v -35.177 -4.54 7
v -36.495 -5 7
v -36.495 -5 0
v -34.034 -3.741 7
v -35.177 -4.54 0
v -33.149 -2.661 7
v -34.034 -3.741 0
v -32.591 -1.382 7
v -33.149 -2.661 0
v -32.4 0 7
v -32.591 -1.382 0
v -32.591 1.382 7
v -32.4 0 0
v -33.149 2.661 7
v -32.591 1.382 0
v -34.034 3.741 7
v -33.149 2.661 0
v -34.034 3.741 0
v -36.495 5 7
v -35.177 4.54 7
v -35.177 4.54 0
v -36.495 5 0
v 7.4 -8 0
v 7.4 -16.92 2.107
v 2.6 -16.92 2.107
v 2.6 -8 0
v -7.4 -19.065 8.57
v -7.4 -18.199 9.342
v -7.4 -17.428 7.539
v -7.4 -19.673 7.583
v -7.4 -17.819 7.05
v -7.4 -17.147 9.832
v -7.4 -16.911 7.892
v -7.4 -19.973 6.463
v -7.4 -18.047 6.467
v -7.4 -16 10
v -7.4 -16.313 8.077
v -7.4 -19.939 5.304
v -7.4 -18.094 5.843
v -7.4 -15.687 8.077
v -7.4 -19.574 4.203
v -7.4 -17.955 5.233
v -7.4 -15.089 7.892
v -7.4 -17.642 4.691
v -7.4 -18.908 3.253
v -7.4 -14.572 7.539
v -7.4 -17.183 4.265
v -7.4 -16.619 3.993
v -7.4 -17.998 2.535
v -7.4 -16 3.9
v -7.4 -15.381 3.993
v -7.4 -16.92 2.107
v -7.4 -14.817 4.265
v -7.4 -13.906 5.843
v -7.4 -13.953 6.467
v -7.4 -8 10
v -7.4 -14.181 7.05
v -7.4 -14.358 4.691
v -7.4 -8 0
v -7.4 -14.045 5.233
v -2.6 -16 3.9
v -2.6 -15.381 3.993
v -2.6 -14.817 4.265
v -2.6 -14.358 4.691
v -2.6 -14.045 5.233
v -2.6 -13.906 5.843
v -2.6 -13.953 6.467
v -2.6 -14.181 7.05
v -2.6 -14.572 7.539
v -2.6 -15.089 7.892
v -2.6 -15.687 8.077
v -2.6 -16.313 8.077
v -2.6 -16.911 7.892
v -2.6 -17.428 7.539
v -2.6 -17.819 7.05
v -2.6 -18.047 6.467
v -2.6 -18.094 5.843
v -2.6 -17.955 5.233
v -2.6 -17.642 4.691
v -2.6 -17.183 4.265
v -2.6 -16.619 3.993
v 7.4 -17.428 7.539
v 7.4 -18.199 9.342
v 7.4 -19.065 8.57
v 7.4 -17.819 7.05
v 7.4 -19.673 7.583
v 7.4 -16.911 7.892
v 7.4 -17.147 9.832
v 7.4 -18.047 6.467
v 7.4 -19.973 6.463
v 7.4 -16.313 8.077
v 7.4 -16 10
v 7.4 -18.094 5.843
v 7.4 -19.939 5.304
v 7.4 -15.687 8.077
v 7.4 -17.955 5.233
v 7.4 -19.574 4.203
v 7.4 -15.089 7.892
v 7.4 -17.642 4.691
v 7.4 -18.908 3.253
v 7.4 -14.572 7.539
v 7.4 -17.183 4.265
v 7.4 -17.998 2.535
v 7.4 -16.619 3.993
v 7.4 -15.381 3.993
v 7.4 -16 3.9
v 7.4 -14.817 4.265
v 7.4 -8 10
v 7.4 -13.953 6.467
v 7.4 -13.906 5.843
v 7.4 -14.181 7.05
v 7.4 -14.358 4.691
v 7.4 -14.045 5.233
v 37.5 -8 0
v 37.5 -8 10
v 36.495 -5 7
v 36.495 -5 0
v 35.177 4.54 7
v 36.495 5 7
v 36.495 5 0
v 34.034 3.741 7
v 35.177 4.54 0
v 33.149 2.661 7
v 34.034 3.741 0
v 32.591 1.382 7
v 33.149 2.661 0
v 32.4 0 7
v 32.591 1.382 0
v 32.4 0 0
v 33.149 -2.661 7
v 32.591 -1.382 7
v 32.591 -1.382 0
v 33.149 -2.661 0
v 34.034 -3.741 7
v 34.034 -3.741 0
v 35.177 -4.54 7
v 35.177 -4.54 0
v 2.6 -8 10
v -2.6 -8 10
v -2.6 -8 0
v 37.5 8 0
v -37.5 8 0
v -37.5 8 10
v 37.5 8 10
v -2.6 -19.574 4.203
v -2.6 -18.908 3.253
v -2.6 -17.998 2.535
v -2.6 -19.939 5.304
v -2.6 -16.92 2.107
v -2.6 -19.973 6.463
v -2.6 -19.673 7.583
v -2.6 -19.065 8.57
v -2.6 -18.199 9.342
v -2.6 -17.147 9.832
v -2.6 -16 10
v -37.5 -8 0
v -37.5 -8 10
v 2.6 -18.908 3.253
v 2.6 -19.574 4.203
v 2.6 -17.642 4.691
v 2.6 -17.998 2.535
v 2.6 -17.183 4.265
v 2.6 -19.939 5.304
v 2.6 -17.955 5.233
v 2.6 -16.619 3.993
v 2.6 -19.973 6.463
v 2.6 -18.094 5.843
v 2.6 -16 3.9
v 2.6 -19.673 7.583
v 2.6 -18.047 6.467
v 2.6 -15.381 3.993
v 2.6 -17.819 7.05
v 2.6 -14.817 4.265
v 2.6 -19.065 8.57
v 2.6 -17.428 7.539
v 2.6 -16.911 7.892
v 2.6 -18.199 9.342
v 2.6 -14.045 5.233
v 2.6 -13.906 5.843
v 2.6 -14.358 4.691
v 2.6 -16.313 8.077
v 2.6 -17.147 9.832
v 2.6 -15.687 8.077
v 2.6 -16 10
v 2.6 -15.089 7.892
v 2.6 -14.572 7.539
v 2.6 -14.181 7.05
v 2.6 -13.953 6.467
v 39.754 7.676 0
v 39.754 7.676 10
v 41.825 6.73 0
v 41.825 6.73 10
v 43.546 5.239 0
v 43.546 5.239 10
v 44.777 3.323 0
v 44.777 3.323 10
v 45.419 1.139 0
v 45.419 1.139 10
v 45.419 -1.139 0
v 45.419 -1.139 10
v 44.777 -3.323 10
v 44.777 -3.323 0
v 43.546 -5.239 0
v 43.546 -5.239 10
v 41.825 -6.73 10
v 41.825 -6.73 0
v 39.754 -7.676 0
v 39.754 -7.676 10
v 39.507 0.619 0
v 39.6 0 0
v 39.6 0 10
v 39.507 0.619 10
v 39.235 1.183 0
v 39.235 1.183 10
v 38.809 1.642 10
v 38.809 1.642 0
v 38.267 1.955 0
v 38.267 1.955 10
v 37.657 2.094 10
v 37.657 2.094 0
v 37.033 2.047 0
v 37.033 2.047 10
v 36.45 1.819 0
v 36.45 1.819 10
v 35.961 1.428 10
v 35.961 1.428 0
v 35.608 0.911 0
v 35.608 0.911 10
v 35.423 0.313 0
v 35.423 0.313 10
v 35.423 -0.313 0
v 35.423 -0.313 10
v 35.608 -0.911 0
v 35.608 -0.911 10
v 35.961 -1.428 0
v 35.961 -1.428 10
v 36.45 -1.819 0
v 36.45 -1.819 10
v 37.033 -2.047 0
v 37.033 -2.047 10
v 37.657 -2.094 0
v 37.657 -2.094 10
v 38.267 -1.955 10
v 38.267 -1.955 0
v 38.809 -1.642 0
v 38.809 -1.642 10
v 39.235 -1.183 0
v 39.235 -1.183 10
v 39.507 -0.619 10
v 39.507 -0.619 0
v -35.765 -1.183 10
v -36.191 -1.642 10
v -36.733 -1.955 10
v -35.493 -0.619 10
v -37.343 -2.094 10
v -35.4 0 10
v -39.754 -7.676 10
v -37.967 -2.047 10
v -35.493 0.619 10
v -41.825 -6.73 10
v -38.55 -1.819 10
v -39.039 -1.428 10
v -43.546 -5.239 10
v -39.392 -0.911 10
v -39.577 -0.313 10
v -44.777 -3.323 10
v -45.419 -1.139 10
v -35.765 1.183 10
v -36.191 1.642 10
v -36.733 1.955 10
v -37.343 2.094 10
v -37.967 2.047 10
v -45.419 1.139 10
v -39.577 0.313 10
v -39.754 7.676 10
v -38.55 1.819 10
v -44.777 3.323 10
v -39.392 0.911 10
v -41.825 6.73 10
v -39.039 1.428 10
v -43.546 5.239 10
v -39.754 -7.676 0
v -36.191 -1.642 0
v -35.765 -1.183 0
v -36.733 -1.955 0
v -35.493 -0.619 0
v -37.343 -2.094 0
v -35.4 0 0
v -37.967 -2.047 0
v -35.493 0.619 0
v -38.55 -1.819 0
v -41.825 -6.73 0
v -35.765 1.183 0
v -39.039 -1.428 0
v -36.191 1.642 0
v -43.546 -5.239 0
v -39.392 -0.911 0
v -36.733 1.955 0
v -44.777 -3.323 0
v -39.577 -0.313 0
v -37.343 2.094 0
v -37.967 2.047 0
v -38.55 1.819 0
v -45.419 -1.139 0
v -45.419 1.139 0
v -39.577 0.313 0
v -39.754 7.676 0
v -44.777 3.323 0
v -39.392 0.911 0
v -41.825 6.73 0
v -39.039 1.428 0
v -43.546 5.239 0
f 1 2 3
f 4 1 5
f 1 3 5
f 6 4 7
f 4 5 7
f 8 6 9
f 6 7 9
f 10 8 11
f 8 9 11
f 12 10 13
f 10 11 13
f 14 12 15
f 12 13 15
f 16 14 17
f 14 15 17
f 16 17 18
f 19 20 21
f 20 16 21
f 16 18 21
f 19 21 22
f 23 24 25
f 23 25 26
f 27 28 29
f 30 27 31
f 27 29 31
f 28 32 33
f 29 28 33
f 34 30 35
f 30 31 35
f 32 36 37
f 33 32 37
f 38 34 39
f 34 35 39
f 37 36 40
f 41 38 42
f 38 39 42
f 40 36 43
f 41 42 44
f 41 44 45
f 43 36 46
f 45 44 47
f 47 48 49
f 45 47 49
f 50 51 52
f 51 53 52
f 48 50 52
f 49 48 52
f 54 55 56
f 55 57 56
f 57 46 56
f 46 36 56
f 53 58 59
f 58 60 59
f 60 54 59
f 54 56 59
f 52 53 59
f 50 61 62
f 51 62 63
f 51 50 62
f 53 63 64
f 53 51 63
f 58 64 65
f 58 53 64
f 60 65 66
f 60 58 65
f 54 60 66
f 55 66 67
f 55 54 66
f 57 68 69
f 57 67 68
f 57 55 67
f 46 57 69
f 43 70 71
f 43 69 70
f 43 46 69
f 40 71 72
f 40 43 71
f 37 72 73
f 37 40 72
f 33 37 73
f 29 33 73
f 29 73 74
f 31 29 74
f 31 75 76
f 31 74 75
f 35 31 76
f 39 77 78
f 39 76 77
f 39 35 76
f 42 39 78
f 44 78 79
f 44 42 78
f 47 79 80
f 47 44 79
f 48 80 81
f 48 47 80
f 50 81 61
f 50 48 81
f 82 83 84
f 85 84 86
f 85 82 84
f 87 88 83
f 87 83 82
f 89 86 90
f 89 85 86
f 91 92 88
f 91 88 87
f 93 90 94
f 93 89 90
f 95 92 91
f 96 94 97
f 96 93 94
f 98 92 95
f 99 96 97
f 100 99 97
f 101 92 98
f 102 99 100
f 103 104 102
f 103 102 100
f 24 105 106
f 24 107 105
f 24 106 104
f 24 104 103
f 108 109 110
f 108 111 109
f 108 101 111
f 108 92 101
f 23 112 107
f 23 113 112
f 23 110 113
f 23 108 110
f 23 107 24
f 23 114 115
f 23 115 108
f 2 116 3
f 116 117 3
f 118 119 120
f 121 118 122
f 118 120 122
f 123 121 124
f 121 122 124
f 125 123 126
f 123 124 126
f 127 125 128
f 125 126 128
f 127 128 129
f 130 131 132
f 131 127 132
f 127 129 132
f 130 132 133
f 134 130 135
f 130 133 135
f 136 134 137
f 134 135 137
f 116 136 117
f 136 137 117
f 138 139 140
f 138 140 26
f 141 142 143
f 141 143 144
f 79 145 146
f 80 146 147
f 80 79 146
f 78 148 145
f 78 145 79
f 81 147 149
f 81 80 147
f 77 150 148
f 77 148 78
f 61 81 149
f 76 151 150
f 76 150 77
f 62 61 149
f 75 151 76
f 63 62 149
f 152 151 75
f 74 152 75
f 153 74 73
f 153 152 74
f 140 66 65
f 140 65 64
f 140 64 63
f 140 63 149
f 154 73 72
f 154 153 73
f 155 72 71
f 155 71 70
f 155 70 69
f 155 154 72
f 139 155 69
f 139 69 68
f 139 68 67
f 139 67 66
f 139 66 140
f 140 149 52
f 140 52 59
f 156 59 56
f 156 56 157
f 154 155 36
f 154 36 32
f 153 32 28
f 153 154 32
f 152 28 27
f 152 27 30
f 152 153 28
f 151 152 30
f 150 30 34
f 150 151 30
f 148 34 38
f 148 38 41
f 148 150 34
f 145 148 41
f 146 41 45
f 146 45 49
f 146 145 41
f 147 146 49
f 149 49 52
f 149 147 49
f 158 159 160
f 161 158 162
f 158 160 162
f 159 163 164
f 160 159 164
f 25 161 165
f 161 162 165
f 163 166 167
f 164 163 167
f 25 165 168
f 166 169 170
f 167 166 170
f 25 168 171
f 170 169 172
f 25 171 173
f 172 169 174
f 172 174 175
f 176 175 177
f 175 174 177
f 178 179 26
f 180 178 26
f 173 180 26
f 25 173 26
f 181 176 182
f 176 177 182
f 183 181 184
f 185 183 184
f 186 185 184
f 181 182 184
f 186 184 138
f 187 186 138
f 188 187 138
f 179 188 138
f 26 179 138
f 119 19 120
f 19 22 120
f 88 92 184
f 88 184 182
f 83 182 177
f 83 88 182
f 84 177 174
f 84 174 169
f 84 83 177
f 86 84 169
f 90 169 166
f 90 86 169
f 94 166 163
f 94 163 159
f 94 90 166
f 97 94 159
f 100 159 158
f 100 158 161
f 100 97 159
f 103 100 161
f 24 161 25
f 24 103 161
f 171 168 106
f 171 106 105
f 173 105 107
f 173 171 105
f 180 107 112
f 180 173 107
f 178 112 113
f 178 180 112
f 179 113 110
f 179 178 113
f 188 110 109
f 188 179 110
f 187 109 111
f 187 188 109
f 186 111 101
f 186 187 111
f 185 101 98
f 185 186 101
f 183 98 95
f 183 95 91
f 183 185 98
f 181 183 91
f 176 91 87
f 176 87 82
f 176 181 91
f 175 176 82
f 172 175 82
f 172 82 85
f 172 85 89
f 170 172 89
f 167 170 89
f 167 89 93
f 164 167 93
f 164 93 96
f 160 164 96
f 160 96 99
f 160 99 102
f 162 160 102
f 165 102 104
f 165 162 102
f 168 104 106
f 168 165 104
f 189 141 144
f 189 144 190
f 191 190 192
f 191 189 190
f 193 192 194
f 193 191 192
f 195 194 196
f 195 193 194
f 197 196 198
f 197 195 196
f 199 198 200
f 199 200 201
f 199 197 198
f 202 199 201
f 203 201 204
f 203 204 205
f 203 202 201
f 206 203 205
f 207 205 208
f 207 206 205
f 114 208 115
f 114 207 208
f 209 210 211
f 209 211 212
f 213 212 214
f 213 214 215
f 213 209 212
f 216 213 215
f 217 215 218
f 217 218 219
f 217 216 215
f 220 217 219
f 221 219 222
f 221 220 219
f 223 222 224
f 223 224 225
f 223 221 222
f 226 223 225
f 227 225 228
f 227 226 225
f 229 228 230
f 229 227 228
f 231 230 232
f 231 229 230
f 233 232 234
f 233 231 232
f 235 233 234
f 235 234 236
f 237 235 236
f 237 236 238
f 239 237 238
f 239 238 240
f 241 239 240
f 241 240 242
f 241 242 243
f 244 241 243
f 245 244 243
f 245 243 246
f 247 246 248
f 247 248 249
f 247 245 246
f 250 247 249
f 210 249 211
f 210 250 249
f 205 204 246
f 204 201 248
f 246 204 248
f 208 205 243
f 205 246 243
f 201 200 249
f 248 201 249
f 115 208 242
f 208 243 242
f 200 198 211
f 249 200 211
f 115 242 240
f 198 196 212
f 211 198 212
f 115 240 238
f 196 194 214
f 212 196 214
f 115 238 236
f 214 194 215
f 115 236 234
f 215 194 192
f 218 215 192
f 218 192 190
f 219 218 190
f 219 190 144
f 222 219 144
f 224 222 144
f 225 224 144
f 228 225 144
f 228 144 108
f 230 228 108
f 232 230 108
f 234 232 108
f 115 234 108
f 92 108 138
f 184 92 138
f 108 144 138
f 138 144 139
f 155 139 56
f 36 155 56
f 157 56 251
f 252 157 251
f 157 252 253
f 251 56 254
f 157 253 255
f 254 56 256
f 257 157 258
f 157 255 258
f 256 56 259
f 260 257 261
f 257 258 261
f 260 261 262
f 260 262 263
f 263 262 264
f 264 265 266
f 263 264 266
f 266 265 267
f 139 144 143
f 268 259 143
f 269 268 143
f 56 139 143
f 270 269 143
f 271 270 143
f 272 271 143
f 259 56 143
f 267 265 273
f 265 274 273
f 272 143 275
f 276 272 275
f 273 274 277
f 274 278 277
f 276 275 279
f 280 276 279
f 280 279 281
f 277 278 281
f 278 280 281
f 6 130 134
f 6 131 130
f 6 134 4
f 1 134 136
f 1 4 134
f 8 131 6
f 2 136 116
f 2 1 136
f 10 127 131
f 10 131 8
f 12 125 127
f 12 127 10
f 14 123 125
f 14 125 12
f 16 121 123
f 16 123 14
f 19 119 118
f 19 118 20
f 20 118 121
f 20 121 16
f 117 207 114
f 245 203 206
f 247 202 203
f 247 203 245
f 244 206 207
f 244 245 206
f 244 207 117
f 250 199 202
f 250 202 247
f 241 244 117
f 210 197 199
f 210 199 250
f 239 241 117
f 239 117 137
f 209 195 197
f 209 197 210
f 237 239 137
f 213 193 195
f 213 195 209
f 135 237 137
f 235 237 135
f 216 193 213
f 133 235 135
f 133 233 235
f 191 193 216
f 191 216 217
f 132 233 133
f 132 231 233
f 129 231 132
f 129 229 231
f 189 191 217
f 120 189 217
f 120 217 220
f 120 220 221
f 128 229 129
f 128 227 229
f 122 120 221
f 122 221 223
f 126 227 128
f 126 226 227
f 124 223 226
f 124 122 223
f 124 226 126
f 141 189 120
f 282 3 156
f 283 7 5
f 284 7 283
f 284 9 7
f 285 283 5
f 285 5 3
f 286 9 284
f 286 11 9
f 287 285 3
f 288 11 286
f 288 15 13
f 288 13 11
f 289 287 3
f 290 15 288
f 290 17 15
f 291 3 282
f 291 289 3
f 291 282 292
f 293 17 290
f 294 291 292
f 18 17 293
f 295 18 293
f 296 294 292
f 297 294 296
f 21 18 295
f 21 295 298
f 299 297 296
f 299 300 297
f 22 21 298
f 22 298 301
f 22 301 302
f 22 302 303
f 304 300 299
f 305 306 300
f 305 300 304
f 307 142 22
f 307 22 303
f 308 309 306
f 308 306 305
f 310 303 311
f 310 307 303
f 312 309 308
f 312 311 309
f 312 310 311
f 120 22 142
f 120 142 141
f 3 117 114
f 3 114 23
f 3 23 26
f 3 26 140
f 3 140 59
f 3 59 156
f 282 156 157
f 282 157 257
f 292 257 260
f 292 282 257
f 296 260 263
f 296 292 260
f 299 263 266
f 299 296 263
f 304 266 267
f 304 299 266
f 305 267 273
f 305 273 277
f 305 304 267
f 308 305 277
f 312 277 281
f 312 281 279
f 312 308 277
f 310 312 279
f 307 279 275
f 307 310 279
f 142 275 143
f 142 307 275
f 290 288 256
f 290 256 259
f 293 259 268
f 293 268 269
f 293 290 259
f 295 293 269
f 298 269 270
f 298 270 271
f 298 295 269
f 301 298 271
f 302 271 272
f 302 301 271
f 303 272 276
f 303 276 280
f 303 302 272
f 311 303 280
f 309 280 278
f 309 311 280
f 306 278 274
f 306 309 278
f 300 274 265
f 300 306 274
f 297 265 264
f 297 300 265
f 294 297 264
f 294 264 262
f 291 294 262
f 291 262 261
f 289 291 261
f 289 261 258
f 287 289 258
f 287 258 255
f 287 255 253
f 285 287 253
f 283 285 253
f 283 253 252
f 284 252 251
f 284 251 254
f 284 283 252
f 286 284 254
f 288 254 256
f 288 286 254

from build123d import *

# Parameters (mm, degrees)
SKETCH1_R               = 2.1
BOSS_EXTRUDE1_DEPTH     = 10
SHELL2_T                = -3
SKETCH2_R               = 2.1
BOSS_EXTRUDE2_DEPTH     = 7.4
SKETCH3_W               = 5.2
SKETCH3_H               = 14
CUT_EXTRUDE1_DEPTH      = 1
CUT_EXTRUDE1_DEPTH_BACK = 11


with BuildPart() as part:
    # Sketch1 → Boss-Extrude1 (new body)
    with BuildSketch(Plane.XY):
        with BuildLine():
            Line((-37.5, 8), (37.5, 8))
            ThreePointArc((37.5, 8), (45.5, 0), (37.5, -8))
            Line((37.5, -8), (-37.5, -8))
            ThreePointArc((-37.5, -8), (-45.5, 0), (-37.5, 8))
        make_face()
        with Locations((-37.5, 0)):
            Circle(SKETCH1_R, mode=Mode.SUBTRACT)
        with Locations((37.5, 0)):
            Circle(SKETCH1_R, mode=Mode.SUBTRACT)
    extrude(amount=BOSS_EXTRUDE1_DEPTH)

    # Shell2
    shell2_openings = [part.faces().sort_by_distance(p)[0] for p in [
        (0, 0, 0),
    ]]
    offset(amount=SHELL2_T, openings=shell2_openings, kind=Kind.INTERSECTION)

    # Sketch2 → Boss-Extrude2 (add, symmetric)
    with BuildSketch(Plane(origin=(0, 0, 0), x_dir=(0, 0, -1), z_dir=(1, 0, 0))):
        with BuildLine():
            Line((-10, -8), (-10, -16))
            ThreePointArc((-10, -16), (-6.46292884, -19.973121807), (-2.107151555, -16.919636334))
            Line((-2.107151555, -16.919636334), (0, -8))
            Line((0, -8), (-10, -8))
        make_face()
        with Locations((-6, -16)):
            Circle(SKETCH2_R, mode=Mode.SUBTRACT)
    extrude(amount=BOSS_EXTRUDE2_DEPTH, both=True)

    # Sketch3 → Cut-Extrude1 (cut, two sides)
    with BuildSketch(Plane.XY.offset(10)) as cut_extrude1_sk:
        with Locations((0, -15)):
            Rectangle(SKETCH3_W, SKETCH3_H)
    extrude(amount=CUT_EXTRUDE1_DEPTH, mode=Mode.SUBTRACT)
    extrude(cut_extrude1_sk.sketch, amount=-CUT_EXTRUDE1_DEPTH_BACK, mode=Mode.SUBTRACT)


solid = part.part
